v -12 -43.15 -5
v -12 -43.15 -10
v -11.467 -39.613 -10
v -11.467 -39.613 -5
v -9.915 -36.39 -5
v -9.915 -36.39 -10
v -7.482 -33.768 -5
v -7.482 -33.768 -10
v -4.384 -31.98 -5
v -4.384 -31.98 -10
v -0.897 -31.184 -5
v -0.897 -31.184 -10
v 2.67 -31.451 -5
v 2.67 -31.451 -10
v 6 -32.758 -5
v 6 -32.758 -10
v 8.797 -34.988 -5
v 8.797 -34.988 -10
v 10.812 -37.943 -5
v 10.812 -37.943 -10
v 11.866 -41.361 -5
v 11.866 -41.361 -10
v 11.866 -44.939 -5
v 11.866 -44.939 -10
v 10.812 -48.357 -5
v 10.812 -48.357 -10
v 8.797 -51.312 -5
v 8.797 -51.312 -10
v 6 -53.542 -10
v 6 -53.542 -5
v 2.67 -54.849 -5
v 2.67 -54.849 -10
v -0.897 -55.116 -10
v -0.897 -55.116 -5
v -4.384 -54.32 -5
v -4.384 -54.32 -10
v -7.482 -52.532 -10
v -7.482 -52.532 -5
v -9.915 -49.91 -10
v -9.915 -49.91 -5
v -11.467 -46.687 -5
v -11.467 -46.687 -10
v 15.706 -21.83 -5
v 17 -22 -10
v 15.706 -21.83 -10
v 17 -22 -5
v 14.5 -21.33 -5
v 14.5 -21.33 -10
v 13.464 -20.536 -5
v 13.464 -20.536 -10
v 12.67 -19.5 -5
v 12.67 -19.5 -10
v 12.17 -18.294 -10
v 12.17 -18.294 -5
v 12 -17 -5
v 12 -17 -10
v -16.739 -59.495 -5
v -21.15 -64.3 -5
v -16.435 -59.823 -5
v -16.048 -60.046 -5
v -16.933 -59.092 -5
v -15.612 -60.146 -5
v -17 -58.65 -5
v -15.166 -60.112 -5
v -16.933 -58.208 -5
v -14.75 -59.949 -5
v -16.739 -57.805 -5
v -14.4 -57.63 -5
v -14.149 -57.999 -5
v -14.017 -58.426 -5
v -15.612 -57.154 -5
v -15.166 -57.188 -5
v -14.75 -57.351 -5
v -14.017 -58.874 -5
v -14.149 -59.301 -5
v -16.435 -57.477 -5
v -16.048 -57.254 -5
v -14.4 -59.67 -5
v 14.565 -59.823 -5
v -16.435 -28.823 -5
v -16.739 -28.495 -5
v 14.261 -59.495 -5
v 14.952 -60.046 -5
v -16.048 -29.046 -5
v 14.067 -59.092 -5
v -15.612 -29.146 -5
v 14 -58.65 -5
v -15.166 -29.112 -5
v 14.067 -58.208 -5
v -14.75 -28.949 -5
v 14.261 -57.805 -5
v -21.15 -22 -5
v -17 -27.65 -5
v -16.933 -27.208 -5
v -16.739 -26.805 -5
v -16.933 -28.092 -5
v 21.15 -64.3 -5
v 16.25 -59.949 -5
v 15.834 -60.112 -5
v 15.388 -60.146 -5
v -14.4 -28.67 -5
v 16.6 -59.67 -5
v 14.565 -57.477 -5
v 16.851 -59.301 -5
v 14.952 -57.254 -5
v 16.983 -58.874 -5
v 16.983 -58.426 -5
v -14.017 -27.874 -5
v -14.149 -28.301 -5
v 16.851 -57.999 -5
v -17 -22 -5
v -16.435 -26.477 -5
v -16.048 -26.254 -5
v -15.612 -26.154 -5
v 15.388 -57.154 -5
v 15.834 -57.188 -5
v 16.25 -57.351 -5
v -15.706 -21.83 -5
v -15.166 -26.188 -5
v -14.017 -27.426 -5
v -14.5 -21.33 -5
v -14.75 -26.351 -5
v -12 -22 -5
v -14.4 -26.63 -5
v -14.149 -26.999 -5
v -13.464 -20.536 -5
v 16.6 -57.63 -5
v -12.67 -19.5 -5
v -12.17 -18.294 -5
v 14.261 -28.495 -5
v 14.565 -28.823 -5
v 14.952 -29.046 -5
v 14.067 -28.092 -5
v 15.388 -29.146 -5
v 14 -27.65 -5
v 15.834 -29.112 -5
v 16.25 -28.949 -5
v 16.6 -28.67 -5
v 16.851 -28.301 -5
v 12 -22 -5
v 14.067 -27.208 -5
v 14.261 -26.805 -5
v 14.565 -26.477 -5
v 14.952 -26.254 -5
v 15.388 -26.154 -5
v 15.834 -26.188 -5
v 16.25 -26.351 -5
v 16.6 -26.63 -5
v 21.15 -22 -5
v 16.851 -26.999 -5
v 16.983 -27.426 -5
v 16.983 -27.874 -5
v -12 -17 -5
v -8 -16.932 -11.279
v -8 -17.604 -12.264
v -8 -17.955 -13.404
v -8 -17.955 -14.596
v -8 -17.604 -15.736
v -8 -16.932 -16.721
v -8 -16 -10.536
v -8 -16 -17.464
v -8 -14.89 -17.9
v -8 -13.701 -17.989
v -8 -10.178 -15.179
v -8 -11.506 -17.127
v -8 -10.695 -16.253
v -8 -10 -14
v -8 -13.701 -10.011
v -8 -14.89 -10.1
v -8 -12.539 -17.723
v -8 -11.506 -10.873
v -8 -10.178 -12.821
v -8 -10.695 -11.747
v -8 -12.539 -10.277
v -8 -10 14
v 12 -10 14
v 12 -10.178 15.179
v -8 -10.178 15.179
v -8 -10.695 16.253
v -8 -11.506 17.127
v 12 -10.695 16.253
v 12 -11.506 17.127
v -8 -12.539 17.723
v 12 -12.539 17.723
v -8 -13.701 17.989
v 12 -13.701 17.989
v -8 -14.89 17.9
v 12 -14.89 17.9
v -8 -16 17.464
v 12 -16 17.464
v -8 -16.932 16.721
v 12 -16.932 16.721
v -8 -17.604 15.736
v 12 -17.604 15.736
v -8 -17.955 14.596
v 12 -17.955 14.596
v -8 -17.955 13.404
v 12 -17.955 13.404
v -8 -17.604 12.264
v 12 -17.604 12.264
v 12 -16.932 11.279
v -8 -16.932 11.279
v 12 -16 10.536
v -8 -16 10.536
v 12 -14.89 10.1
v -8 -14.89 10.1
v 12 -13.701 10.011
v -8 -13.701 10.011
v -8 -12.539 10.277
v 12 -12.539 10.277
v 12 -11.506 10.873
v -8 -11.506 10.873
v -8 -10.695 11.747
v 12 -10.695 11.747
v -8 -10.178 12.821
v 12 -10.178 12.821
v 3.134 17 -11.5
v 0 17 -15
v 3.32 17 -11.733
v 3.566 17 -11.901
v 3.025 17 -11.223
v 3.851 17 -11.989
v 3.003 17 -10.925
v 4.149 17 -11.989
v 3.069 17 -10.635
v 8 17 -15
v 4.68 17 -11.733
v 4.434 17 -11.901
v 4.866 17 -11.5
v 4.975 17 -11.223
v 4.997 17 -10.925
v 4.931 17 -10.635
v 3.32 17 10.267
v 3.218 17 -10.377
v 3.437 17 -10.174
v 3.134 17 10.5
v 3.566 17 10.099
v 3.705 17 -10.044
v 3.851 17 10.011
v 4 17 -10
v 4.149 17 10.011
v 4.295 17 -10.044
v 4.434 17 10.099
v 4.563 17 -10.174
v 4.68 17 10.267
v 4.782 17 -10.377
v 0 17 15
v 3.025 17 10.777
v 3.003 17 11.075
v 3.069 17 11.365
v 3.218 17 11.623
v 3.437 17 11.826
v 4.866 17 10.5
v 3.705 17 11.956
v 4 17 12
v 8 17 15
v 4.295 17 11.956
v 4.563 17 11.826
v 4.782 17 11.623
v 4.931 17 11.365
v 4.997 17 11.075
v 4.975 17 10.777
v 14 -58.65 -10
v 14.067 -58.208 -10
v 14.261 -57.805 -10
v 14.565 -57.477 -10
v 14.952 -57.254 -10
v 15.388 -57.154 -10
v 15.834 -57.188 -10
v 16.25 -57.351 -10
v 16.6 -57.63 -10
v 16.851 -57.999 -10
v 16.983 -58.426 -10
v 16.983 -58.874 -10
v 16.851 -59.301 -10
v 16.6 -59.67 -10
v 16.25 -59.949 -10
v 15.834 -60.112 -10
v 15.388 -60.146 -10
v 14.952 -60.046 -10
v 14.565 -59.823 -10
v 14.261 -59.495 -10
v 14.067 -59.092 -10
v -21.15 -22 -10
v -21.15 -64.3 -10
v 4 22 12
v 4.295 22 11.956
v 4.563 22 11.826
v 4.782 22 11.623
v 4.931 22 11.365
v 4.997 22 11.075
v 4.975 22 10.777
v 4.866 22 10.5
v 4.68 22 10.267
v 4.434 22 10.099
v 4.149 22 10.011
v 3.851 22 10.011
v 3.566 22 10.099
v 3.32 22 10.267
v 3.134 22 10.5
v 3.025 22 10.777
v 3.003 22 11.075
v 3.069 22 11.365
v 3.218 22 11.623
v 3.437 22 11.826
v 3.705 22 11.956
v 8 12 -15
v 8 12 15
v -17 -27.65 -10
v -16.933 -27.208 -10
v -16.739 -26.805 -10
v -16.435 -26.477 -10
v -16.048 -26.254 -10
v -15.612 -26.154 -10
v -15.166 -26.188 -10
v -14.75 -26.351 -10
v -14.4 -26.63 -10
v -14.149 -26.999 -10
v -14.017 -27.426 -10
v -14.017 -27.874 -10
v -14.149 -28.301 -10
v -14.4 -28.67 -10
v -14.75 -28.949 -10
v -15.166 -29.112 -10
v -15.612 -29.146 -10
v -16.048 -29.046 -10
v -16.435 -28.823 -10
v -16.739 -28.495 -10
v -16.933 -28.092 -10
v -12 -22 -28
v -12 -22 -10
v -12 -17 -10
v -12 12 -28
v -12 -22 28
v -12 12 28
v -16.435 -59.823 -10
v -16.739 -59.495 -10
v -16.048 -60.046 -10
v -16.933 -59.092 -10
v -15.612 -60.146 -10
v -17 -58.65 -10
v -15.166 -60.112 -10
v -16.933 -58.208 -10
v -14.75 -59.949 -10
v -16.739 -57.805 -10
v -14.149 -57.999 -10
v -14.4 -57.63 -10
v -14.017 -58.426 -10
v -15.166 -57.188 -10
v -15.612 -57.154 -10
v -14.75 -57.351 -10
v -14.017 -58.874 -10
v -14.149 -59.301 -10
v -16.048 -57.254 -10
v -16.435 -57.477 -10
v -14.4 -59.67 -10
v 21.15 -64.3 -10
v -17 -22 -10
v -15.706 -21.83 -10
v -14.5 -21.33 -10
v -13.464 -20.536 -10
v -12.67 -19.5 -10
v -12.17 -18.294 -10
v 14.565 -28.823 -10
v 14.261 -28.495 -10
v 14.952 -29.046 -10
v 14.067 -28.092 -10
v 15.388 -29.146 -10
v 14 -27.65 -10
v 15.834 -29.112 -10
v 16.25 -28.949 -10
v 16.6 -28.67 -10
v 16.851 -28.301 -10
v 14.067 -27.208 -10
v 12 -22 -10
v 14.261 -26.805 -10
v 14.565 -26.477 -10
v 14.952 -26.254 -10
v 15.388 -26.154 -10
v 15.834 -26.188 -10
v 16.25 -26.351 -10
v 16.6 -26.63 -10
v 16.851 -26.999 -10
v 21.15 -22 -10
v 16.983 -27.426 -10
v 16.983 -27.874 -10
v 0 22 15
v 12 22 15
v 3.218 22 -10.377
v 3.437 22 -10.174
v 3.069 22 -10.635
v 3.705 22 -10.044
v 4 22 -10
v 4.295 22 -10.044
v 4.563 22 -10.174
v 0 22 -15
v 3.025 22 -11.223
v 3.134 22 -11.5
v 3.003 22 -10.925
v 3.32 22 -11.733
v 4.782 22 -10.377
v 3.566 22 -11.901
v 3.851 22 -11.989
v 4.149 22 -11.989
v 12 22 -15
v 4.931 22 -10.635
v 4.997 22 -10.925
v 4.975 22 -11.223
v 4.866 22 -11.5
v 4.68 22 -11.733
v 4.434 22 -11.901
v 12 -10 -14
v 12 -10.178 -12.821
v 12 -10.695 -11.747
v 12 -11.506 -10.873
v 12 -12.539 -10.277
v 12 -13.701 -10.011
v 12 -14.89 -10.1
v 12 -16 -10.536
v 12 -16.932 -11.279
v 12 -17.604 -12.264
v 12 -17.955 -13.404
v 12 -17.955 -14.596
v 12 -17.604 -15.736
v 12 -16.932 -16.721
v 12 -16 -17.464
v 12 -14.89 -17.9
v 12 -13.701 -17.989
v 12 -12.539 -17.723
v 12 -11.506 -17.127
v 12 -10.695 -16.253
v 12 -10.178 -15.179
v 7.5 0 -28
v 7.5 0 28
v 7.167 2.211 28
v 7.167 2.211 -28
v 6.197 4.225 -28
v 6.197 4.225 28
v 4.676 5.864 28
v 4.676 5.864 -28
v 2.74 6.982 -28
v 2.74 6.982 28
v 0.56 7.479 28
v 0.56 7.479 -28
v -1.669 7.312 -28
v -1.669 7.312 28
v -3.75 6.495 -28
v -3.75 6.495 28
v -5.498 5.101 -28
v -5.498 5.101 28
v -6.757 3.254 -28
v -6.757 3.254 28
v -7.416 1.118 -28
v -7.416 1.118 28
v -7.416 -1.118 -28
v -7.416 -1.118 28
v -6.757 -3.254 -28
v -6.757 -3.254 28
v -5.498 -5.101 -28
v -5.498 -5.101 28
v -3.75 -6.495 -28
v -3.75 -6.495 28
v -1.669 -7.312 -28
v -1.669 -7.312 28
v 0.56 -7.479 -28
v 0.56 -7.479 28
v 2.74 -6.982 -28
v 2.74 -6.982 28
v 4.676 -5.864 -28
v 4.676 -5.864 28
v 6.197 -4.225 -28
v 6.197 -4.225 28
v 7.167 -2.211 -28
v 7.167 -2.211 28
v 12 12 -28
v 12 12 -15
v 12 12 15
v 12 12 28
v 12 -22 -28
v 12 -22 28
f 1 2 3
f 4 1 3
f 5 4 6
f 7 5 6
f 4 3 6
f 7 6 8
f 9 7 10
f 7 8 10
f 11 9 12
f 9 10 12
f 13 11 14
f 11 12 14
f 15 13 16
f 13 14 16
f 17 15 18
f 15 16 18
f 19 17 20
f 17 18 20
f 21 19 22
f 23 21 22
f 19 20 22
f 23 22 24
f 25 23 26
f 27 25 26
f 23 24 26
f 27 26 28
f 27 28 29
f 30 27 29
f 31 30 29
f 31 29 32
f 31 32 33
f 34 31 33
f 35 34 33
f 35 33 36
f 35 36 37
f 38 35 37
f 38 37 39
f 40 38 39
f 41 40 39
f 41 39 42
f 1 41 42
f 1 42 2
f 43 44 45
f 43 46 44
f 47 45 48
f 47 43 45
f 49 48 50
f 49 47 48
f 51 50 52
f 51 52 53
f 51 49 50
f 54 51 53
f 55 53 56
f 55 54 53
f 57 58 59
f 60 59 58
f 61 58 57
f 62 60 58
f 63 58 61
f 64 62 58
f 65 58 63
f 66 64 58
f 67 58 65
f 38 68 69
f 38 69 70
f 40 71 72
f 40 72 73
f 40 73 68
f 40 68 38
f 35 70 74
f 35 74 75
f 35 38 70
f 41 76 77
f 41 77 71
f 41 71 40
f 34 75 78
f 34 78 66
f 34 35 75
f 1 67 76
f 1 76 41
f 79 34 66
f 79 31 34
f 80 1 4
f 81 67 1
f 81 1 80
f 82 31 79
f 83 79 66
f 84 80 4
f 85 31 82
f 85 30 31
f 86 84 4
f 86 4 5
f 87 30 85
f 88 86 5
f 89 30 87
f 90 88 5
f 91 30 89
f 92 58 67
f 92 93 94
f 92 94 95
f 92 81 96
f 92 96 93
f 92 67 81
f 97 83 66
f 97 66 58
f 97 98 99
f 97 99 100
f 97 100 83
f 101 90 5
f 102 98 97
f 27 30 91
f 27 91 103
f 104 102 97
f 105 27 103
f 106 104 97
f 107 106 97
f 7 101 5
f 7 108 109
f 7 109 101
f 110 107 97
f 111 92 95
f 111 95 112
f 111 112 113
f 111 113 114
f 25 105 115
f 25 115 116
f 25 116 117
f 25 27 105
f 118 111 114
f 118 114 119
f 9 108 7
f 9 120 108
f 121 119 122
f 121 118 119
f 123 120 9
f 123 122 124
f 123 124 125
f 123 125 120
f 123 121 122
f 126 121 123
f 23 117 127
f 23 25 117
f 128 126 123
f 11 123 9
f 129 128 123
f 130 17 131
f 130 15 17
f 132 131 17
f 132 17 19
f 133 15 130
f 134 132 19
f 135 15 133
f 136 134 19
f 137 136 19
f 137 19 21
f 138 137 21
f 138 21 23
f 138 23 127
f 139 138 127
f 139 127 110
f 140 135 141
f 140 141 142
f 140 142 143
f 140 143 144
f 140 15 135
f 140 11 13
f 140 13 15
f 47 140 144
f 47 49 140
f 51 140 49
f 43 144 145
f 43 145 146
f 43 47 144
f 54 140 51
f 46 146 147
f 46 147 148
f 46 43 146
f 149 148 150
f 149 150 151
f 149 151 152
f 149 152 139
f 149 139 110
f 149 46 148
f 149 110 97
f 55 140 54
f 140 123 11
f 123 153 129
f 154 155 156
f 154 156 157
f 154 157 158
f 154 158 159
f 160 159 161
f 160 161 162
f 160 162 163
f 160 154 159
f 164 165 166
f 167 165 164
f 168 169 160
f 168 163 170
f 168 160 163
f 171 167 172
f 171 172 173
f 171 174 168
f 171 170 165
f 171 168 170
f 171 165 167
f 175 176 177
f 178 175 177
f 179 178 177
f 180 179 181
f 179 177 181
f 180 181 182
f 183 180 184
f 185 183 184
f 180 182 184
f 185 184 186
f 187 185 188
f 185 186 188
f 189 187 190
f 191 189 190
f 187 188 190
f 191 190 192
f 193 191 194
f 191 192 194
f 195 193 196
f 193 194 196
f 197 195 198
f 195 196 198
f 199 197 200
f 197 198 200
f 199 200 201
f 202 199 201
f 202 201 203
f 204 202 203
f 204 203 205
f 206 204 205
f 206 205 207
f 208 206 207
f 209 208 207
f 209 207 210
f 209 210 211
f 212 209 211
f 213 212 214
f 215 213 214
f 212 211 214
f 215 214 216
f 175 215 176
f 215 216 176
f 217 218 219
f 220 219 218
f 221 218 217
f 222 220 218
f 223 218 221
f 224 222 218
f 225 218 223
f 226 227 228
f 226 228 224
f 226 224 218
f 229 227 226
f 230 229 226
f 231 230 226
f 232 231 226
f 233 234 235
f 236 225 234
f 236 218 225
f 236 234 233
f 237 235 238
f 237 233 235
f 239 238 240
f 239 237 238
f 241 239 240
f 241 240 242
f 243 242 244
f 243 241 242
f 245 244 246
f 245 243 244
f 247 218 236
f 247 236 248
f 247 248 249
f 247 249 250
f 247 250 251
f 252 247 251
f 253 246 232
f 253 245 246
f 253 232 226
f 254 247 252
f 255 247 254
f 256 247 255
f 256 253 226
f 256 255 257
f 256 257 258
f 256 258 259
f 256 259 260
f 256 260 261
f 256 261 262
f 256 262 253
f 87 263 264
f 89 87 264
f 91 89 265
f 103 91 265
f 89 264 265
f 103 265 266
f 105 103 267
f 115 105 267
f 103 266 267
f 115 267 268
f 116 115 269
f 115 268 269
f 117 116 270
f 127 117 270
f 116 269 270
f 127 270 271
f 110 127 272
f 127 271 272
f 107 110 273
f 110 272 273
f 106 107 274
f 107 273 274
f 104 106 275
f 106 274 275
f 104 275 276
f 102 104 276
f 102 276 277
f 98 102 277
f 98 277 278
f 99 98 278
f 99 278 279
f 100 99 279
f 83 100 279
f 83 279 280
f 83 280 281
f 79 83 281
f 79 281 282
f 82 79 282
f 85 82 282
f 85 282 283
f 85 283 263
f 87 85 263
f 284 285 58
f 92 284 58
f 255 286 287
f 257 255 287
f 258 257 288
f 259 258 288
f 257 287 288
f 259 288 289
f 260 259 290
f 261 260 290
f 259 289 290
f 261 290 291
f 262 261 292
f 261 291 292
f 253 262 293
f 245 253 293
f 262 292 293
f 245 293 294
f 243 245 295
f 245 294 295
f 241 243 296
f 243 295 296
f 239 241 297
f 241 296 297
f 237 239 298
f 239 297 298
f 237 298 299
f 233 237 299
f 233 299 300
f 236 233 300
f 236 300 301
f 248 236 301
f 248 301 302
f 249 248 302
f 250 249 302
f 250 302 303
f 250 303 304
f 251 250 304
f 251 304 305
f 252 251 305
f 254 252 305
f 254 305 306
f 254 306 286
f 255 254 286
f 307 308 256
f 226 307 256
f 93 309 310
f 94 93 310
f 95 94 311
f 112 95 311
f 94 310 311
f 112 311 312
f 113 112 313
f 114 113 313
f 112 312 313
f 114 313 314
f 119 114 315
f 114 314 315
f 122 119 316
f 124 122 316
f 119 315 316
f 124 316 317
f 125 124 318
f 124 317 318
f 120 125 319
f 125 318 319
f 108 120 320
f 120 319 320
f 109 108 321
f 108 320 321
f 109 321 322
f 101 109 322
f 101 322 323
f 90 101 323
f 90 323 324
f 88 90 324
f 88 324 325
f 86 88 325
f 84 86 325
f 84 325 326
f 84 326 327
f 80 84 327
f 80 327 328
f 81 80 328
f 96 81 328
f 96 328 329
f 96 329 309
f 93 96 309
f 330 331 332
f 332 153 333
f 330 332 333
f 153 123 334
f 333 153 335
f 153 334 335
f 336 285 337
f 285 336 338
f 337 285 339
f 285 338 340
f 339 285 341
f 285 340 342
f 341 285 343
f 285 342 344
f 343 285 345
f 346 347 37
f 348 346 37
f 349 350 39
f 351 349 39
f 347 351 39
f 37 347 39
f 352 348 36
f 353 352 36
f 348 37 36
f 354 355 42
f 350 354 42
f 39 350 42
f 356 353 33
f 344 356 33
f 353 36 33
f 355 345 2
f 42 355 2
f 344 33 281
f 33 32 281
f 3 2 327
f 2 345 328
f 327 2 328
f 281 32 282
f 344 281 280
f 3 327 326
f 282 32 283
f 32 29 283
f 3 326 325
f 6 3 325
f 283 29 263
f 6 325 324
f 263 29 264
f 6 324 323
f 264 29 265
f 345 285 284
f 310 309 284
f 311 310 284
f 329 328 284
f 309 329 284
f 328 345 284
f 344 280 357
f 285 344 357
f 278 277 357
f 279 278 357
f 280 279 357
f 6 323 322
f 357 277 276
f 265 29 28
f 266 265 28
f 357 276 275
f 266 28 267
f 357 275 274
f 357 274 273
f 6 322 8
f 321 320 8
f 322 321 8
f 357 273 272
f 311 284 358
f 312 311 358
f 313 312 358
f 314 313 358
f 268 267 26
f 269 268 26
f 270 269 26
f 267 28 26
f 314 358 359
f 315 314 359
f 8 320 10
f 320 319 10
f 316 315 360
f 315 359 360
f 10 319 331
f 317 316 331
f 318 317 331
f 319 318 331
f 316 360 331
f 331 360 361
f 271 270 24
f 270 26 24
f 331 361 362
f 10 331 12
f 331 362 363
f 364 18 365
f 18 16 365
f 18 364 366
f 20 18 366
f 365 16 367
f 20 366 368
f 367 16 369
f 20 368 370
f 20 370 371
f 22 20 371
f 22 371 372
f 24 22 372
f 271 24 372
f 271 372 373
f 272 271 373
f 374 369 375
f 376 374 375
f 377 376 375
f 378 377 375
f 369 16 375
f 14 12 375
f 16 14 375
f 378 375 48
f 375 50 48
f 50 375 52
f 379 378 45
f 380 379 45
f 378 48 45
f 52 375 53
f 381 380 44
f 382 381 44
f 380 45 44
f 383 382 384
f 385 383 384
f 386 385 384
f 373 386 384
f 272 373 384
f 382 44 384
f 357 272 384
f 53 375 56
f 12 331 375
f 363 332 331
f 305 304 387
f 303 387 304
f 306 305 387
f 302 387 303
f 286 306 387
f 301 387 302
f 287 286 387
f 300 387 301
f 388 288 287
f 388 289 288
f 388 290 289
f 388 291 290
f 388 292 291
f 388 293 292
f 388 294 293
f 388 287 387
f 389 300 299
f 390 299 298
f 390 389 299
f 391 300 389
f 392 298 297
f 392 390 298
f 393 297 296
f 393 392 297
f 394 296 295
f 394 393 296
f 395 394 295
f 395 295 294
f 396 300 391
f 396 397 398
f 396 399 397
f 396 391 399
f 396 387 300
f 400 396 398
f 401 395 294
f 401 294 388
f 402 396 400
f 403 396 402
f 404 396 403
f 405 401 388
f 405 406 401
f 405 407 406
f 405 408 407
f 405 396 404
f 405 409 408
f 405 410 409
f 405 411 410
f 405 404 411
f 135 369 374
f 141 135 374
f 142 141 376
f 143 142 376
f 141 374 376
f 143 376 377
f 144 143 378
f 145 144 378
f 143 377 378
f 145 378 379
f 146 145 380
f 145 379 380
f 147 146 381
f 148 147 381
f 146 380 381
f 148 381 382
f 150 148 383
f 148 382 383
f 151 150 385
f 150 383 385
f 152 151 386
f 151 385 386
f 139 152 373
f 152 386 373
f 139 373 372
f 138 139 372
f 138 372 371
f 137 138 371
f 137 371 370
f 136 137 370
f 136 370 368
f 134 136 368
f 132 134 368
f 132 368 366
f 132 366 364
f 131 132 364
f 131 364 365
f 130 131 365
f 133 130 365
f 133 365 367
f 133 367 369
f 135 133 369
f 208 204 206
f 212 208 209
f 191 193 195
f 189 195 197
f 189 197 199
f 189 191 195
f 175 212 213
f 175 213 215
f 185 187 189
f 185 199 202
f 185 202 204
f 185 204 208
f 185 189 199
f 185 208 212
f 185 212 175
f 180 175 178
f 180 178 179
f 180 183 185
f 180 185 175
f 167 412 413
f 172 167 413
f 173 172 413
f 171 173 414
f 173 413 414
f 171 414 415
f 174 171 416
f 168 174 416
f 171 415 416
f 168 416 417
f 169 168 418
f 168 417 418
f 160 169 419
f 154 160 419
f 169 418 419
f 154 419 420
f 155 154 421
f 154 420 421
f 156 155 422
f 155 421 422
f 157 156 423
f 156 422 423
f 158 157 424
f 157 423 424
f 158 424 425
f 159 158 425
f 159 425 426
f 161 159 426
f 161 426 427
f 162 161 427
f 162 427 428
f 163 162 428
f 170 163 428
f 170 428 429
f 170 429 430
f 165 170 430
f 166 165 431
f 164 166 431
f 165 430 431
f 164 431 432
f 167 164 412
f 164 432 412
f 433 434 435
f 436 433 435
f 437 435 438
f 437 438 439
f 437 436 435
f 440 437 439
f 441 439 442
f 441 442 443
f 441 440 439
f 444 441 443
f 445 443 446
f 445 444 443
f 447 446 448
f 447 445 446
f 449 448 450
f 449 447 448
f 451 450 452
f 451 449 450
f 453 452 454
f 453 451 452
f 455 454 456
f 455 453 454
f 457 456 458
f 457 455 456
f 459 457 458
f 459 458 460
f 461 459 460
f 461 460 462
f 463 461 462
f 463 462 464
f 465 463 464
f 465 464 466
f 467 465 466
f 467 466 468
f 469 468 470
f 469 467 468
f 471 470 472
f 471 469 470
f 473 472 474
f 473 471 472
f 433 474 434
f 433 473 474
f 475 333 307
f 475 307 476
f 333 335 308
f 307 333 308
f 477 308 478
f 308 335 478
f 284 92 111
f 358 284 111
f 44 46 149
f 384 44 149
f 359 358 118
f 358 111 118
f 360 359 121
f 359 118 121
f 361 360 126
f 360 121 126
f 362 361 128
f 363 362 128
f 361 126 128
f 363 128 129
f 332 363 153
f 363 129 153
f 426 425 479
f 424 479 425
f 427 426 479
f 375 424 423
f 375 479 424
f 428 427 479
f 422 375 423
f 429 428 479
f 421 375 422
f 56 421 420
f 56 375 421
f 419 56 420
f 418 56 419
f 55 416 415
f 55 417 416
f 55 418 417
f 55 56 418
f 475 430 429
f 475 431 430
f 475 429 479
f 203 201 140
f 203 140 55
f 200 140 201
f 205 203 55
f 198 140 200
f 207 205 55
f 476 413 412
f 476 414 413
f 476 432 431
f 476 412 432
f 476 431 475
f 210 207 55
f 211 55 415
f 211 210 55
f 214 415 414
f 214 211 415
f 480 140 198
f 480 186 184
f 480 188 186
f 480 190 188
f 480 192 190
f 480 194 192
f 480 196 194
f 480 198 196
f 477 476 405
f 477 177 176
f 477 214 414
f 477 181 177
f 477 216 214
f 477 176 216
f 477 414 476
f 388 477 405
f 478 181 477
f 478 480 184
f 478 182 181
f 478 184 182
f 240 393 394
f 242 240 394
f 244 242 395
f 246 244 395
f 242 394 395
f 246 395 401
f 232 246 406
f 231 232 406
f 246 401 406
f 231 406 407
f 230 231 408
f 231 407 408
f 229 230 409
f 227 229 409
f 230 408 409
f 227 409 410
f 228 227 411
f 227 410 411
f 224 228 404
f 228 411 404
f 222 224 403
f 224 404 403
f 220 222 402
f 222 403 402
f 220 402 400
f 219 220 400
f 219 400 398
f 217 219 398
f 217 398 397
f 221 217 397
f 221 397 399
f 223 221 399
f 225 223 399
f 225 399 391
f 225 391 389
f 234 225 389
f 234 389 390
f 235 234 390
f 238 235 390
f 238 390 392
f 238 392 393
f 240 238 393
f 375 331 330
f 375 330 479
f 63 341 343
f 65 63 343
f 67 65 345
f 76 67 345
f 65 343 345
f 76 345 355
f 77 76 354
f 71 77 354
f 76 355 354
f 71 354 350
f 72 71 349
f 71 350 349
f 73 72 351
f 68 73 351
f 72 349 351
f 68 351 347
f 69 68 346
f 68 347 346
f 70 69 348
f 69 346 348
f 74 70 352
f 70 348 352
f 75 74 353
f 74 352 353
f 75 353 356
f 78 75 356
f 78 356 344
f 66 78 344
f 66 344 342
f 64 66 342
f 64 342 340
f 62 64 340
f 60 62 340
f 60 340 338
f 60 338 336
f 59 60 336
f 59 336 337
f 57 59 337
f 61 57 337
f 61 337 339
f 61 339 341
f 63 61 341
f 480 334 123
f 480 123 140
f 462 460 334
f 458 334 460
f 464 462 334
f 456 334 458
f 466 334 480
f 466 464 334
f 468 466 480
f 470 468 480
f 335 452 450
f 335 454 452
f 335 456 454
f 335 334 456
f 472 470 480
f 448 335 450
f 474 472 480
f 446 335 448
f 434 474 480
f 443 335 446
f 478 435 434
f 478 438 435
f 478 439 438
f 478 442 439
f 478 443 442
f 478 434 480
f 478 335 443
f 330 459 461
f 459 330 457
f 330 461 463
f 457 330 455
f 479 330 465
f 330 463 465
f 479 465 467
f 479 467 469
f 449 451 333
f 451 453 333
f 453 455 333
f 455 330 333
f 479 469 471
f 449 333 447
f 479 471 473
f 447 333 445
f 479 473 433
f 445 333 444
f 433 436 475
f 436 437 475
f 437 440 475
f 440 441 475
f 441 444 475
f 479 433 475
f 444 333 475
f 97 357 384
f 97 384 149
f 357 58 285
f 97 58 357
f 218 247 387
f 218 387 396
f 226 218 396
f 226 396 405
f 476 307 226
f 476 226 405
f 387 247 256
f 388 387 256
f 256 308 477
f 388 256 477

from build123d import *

# Parameters (mm, degrees)
SKETCH1_W           = 24
SKETCH1_H           = 34
SKETCH1_R           = 7.5
BOSS_EXTRUDE1_DEPTH = 28
SKETCH5_W           = 12
SKETCH5_H           = 30
BOSS_EXTRUDE3_DEPTH = 10
SKETCH6_W           = 8
SKETCH6_H           = 5
CUT_EXTRUDE3_DEPTH  = 50.769468553
CUT_EXTRUDE4_REACH  = 55.516
SKETCH7_R           = 1
SKETCH8_R           = 4
CUT_EXTRUDE5_DEPTH  = 20
SKETCH9_W           = 42.3
SKETCH9_H           = 5
BOSS_EXTRUDE4_DEPTH = 42.3
SKETCH10_R          = 12
SKETCH10_R_2        = 1.5
CUT_EXTRUDE6_DEPTH  = 48
FILLET1_R           = 5
FILLET2_R           = 5


with BuildPart() as part:
    # Sketch1 → Boss-Extrude1 (new, symmetric)
    with BuildSketch(Plane.XY):
        with Locations((0, -5)):
            Rectangle(SKETCH1_W, SKETCH1_H)
        Circle(SKETCH1_R, mode=Mode.SUBTRACT)
    extrude(amount=BOSS_EXTRUDE1_DEPTH, both=True)

    # Sketch5 → Boss-Extrude3 (add)
    with BuildSketch(Plane(origin=(0, 12, 0), x_dir=(1, 0, 0), z_dir=(0, 1, 0))):
        with Locations((6, 0)):
            Rectangle(SKETCH5_W, SKETCH5_H)
    extrude(amount=BOSS_EXTRUDE3_DEPTH)

    # Sketch6 → Cut-Extrude3 (cut, through all)
    with BuildSketch(Plane.XY.offset(15)):
        with Locations((4, 14.5)):
            Rectangle(SKETCH6_W, SKETCH6_H)
    extrude(amount=-CUT_EXTRUDE3_DEPTH, mode=Mode.SUBTRACT)

    # Sketch7 → Cut-Extrude4 (cut, up to next)
    with BuildSketch(Plane(origin=(0, 22, 0), x_dir=(1, 0, 0), z_dir=(0, 1, 0)), mode=Mode.PRIVATE) as cut_extrude4_sk1:
        with Locations(Location((4, 11, 0), (0, 0, 270))):
            Circle(SKETCH7_R)
    cut_extrude4_tool1 = extrude(cut_extrude4_sk1.sketch, amount=-CUT_EXTRUDE4_REACH, mode=Mode.PRIVATE) & part.part
    # Sketch7 → Cut-Extrude4 (cut, up to next)
    with BuildSketch(Plane(origin=(0, 22, 0), x_dir=(1, 0, 0), z_dir=(0, 1, 0)), mode=Mode.PRIVATE) as cut_extrude4_sk2:
        with Locations(Location((4, -11, 0), (0, 0, 270))):
            Circle(SKETCH7_R)
    cut_extrude4_tool2 = extrude(cut_extrude4_sk2.sketch, amount=-CUT_EXTRUDE4_REACH, mode=Mode.PRIVATE) & part.part
    add(cut_extrude4_tool1.solids().sort_by_distance((4, 22, -11))[0], mode=Mode.SUBTRACT)
    add(cut_extrude4_tool2.solids().sort_by_distance((4, 22, 11))[0], mode=Mode.SUBTRACT)

    # Sketch8 → Cut-Extrude5 (cut)
    with BuildSketch(Plane(origin=(12, 0, 0), x_dir=(0, 0, -1), z_dir=(1, 0, 0))):
        with Locations(Location((-14, -14, 0), (0, 0, 90))):
            Circle(SKETCH8_R)
        with Locations(Location((14, -14, 0), (0, 0, 90))):
            Circle(SKETCH8_R)
    extrude(amount=-CUT_EXTRUDE5_DEPTH, mode=Mode.SUBTRACT)

    # Sketch9 → Boss-Extrude4 (add)
    with BuildSketch(Plane.XZ.offset(22)):
        with Locations((0, -7.5)):
            Rectangle(SKETCH9_W, SKETCH9_H)
    extrude(amount=BOSS_EXTRUDE4_DEPTH)

    # Sketch10 → Cut-Extrude6 (cut)
    with BuildSketch(Plane(origin=(0, 0, -10), x_dir=(-1, 0, 0), z_dir=(0, 0, -1))):
        with Locations((0, -43.15)):
            Circle(SKETCH10_R)
        with Locations((-15.5, -27.65)):
            Circle(SKETCH10_R_2)
        with Locations((15.5, -27.65)):
            Circle(SKETCH10_R_2)
        with Locations((15.5, -58.65)):
            Circle(SKETCH10_R_2)
        with Locations((-15.5, -58.65)):
            Circle(SKETCH10_R_2)
    extrude(amount=-CUT_EXTRUDE6_DEPTH, mode=Mode.SUBTRACT)

    # Fillet1
    fillet1_edges = [part.edges().sort_by_distance(p)[0] for p in [
        (-12, -22, -7.5),
    ]]
    fillet(fillet1_edges, radius=FILLET1_R)

    # Fillet2
    fillet2_edges = [part.edges().sort_by_distance(p)[0] for p in [
        (12, -22, -7.5),
    ]]
    fillet(fillet2_edges, radius=FILLET2_R)


solid = part.part
